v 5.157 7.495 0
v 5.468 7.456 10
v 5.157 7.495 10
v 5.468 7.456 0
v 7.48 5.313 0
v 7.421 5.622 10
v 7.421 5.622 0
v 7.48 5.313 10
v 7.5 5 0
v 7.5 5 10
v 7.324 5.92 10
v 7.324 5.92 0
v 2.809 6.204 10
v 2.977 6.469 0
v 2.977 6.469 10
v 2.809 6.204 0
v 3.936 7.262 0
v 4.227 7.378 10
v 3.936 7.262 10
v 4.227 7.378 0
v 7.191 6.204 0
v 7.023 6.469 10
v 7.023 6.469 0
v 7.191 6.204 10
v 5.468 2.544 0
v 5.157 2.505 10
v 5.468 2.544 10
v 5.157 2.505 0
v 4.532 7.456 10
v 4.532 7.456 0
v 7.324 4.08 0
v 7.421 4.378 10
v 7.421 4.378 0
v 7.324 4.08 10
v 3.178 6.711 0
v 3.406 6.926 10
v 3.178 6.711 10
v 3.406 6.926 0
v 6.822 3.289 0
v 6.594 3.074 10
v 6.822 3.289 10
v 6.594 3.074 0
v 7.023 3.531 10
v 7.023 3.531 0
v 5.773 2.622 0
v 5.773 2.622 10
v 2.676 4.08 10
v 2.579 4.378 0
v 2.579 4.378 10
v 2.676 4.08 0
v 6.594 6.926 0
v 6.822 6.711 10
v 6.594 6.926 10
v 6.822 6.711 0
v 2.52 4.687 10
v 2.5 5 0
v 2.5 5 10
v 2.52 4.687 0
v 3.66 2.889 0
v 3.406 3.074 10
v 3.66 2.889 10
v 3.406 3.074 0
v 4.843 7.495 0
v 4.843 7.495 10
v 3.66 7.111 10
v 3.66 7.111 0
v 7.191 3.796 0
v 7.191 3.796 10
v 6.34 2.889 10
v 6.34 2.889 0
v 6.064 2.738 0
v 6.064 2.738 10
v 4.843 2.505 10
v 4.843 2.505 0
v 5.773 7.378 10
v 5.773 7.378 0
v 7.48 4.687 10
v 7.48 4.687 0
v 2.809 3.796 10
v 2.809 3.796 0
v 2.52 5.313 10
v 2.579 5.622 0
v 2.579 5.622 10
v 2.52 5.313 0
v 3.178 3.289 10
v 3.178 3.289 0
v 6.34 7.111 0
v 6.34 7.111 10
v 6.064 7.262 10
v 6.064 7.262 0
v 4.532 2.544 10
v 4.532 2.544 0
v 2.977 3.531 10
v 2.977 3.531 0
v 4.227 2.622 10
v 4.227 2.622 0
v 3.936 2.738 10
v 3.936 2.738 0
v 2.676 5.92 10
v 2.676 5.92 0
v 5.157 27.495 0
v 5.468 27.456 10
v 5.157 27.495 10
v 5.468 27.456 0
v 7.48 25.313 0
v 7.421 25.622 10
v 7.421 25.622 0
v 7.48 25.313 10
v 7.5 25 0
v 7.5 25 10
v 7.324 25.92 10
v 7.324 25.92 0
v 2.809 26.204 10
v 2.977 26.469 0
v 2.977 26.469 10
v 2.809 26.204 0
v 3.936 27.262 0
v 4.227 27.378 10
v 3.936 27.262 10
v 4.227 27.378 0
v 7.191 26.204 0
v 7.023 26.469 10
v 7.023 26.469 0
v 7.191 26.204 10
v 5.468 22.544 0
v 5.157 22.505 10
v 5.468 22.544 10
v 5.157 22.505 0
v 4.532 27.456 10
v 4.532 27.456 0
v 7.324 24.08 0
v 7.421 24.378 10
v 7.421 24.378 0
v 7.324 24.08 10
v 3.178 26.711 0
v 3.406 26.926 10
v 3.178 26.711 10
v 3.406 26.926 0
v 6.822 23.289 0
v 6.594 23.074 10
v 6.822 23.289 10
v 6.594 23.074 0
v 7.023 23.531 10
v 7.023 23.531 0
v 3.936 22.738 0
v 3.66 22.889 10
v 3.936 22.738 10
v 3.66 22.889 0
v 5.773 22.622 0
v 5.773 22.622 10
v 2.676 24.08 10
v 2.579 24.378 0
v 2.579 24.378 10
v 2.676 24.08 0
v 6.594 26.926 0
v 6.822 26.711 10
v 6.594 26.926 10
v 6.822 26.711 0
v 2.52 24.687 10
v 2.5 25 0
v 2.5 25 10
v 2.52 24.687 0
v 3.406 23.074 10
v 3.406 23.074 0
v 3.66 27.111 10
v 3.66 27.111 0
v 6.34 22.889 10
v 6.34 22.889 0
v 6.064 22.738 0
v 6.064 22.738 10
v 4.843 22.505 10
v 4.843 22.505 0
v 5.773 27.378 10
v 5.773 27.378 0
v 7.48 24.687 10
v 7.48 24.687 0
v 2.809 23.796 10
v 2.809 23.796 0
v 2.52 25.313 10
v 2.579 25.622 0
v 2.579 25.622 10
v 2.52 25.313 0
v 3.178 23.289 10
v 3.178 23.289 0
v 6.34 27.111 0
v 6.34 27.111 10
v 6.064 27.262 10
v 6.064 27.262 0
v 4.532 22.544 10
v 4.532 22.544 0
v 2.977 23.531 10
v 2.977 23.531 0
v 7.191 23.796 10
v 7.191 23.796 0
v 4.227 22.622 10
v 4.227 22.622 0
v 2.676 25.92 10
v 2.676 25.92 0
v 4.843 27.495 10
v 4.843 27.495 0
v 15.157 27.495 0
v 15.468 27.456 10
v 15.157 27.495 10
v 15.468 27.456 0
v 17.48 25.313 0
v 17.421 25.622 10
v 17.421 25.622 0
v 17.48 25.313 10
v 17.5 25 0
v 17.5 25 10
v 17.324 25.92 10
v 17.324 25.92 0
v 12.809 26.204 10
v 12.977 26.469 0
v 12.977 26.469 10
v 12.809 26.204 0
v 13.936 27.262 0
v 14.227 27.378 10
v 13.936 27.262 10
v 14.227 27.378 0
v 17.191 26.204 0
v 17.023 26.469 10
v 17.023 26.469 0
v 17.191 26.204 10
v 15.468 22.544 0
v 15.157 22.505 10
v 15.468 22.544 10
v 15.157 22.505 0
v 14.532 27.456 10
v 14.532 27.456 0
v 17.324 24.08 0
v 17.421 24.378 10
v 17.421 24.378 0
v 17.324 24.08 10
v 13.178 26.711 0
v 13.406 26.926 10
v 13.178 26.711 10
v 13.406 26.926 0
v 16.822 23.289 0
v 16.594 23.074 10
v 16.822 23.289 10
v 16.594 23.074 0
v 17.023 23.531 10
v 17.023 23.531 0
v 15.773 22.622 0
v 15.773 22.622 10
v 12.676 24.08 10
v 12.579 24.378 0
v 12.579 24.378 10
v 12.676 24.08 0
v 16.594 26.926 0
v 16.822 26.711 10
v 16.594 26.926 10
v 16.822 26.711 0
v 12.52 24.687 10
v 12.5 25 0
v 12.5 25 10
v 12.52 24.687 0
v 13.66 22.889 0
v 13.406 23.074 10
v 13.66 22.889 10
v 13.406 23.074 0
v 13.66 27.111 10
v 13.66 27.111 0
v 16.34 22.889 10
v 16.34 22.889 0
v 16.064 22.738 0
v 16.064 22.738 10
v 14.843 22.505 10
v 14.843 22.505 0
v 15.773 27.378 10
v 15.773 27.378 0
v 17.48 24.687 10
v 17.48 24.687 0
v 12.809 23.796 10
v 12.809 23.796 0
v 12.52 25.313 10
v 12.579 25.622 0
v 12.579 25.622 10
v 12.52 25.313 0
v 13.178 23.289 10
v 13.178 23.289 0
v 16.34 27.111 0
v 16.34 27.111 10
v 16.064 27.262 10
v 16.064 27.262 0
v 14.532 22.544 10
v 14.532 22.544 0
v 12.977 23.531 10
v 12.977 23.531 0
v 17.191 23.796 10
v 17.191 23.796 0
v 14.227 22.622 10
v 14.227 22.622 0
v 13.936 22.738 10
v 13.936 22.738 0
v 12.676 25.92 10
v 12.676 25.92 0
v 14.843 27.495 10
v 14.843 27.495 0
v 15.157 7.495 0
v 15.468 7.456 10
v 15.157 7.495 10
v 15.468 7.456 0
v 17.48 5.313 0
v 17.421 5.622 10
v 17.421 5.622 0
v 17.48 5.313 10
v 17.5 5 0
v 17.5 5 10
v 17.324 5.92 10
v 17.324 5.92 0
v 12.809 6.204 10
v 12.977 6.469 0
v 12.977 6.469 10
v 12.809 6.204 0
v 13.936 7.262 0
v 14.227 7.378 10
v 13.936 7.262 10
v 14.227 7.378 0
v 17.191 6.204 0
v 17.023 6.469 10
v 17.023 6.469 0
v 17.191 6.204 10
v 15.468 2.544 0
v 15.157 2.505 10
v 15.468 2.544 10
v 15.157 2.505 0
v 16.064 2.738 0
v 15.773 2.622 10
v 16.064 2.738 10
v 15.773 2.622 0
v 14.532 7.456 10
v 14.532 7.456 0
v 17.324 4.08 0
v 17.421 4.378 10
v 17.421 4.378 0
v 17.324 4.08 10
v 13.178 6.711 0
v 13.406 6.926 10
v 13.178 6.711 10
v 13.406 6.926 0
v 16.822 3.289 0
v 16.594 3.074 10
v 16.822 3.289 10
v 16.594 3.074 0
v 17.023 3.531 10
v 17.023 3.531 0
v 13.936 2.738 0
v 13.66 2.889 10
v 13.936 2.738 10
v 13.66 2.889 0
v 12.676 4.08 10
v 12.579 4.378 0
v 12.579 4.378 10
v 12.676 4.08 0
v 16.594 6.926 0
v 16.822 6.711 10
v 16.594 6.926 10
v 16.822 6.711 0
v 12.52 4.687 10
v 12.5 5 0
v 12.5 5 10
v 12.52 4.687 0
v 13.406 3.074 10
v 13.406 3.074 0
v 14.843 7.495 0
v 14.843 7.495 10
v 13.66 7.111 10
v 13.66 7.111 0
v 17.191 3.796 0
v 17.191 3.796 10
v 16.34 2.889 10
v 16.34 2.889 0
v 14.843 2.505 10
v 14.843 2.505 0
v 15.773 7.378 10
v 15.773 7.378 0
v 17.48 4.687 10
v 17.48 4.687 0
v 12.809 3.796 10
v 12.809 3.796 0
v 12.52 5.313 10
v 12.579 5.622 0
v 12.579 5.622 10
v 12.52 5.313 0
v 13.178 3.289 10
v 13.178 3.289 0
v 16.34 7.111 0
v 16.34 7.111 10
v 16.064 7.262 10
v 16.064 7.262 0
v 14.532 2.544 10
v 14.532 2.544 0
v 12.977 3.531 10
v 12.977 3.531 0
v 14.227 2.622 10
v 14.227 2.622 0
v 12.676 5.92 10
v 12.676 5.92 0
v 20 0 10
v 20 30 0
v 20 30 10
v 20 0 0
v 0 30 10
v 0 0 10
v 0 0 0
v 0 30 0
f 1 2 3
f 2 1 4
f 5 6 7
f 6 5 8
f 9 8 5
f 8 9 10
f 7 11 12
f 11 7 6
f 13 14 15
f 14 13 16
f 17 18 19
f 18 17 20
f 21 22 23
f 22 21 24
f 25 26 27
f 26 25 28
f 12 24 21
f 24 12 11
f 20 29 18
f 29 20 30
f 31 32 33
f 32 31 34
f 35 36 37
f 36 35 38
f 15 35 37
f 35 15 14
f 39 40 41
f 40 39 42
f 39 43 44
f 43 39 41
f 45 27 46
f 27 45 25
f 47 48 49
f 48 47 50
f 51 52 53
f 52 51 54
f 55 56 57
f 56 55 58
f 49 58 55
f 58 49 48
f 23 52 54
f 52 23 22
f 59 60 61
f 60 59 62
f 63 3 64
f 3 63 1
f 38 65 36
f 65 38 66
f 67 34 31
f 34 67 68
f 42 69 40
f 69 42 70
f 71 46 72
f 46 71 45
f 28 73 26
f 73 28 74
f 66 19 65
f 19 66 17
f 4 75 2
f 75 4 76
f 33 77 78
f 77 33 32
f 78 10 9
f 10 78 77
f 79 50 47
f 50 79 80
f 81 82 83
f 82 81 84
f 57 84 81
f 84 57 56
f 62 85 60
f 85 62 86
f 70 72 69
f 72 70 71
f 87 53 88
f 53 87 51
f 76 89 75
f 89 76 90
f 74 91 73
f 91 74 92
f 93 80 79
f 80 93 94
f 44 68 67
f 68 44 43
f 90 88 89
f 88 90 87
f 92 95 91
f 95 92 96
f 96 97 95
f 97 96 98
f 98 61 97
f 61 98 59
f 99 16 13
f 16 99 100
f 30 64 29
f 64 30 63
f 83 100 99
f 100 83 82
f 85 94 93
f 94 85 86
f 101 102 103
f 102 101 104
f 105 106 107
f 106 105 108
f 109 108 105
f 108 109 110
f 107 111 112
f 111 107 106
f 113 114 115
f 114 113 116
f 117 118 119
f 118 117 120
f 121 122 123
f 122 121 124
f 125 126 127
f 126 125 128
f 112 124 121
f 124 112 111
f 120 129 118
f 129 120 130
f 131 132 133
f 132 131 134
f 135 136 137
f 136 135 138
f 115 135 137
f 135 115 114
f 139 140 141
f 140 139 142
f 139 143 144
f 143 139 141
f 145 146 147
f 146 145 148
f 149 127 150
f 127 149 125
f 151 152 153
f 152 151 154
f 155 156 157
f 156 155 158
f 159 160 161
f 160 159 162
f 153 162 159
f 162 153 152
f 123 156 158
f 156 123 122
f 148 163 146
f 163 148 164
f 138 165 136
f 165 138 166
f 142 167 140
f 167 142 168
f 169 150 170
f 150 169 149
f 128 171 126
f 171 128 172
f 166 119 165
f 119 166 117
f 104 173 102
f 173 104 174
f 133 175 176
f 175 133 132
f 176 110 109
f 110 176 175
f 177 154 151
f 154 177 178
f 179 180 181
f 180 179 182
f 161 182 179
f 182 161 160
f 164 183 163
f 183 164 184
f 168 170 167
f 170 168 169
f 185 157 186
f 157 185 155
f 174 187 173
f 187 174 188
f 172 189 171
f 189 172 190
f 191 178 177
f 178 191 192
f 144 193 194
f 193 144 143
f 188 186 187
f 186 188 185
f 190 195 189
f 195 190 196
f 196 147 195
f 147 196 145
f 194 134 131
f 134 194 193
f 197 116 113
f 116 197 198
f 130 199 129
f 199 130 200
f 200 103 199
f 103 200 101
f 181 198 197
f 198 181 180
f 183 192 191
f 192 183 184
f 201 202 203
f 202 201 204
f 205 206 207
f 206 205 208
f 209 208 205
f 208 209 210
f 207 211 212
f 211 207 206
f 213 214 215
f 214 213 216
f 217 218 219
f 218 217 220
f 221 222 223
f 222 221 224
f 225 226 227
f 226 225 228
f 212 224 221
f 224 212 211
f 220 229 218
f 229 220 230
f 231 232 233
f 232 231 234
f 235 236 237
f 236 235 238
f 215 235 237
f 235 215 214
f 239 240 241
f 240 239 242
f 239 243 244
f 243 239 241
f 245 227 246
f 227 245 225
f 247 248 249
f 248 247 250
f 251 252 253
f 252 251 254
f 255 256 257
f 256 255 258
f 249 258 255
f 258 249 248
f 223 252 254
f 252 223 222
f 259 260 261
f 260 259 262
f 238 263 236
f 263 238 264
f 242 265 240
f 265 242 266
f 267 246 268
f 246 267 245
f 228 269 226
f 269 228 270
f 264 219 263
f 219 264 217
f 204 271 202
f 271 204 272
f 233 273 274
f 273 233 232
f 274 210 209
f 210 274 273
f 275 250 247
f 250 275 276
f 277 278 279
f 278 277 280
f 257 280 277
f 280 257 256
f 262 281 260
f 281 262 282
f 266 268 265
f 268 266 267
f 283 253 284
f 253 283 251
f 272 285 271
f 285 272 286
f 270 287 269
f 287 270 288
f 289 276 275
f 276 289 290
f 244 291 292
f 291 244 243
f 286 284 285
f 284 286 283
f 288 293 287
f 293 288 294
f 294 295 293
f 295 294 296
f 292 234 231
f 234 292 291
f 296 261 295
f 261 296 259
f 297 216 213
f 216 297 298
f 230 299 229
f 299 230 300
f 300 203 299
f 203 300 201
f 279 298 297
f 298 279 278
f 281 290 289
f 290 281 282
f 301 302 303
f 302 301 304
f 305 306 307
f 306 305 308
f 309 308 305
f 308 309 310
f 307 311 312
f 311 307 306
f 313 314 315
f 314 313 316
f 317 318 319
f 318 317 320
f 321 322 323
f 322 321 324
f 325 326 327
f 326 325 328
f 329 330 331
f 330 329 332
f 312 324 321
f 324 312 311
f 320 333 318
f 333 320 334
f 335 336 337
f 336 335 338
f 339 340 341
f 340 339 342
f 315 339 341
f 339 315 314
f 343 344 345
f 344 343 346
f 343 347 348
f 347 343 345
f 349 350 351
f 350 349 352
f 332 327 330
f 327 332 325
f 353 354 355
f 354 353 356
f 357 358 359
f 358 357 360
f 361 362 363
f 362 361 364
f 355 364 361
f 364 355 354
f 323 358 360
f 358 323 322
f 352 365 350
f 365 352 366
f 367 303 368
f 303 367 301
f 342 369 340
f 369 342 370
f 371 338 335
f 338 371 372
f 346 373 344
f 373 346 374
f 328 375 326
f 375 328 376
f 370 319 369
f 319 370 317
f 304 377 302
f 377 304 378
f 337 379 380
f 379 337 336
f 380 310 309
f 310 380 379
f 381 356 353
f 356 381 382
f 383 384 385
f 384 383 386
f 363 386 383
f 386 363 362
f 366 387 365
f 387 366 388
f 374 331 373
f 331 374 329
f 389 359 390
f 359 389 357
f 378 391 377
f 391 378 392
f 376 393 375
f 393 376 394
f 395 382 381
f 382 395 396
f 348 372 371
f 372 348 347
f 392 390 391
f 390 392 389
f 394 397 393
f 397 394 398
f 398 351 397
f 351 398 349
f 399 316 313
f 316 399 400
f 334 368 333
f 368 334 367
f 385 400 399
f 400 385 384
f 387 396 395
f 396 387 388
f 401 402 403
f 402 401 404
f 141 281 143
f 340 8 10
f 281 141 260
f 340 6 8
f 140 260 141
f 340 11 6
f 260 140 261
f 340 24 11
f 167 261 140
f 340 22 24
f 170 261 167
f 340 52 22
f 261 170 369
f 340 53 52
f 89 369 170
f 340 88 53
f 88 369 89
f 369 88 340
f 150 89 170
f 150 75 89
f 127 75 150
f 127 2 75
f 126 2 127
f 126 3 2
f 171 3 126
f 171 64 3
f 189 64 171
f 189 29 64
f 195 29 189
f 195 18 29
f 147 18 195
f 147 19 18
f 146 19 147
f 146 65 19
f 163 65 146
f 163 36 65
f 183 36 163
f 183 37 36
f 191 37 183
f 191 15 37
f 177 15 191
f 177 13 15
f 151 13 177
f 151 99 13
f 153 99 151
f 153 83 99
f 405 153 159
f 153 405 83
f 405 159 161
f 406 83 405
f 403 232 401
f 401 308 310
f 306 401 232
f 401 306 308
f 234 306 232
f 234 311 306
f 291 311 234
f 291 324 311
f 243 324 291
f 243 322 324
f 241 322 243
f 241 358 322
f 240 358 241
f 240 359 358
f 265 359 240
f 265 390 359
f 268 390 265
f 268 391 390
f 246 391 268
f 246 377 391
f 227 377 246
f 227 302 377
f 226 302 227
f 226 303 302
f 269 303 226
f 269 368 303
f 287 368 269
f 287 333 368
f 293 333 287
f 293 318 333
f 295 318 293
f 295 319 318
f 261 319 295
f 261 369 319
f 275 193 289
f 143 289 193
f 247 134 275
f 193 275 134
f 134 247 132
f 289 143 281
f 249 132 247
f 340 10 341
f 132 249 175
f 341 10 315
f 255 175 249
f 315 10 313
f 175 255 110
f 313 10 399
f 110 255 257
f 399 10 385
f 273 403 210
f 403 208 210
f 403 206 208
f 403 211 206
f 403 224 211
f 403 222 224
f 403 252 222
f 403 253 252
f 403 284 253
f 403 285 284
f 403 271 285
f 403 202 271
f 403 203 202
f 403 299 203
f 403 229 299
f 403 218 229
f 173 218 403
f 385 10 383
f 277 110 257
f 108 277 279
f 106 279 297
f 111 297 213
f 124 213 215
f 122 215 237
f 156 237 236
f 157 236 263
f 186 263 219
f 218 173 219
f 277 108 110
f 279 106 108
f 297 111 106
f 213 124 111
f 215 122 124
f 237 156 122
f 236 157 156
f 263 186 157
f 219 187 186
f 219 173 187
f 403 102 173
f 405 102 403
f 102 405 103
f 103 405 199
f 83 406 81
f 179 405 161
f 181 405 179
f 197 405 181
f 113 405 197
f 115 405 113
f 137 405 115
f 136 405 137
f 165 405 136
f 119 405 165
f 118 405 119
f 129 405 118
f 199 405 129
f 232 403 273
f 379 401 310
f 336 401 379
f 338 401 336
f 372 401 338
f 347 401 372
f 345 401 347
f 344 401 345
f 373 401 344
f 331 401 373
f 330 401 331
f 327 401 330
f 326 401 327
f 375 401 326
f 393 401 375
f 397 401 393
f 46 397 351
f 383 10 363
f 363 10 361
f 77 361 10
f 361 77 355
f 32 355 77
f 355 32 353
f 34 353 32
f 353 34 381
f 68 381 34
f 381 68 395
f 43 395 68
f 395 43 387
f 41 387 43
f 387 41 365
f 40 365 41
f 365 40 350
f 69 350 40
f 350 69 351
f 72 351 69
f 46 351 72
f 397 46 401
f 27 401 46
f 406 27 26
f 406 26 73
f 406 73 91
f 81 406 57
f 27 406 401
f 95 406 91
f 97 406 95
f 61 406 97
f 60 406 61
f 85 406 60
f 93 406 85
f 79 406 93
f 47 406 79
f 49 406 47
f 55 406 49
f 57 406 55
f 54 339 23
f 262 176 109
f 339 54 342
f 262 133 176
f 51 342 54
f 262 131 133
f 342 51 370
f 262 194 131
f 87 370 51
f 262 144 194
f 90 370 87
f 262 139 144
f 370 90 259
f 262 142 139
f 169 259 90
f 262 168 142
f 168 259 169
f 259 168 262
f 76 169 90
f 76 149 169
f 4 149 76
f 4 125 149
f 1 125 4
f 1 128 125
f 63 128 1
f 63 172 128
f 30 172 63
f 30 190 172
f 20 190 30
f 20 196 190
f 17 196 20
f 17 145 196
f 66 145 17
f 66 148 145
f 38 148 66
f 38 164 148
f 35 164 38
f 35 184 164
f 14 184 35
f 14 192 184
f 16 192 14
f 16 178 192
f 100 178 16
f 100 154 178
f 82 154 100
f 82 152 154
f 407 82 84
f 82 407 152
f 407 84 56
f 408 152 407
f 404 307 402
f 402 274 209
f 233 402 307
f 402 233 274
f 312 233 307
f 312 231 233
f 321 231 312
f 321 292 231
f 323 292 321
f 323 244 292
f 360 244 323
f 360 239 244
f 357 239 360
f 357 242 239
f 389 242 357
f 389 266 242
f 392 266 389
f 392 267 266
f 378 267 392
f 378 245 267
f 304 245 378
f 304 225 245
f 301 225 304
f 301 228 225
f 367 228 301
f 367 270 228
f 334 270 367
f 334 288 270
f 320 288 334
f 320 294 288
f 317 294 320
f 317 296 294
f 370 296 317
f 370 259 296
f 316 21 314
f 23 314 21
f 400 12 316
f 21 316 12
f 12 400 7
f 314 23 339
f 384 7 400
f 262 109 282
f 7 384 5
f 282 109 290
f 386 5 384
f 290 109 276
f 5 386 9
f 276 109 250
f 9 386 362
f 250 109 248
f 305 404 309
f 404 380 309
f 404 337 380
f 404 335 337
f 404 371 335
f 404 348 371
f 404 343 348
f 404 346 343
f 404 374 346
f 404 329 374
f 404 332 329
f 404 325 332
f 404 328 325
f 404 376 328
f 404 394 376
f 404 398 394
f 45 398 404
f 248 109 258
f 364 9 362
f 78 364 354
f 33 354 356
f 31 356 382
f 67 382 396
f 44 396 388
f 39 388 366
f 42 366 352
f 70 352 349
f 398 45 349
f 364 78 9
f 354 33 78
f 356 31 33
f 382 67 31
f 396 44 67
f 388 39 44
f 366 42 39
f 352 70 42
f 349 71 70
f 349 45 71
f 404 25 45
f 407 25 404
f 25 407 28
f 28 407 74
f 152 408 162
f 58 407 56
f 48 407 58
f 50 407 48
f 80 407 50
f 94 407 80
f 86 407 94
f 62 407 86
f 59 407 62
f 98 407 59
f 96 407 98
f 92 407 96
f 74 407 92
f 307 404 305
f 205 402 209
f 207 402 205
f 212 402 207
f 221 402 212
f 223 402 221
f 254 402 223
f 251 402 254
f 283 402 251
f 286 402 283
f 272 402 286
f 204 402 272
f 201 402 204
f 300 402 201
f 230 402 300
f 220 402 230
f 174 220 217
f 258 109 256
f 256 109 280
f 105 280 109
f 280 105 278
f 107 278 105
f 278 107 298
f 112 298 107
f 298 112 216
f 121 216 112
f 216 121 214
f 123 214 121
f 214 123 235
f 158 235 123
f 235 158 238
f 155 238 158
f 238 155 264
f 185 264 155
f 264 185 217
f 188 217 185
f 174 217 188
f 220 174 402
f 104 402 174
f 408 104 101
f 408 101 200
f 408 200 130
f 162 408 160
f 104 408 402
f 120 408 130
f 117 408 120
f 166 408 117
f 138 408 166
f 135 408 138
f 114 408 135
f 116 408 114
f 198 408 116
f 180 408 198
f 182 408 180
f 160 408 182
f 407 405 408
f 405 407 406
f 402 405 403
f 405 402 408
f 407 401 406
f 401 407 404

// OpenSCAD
// file: round-hole.scad
// Round Hole

// Defaults

gRes = 50;
gNudge = 0.01;

module RoundHole(
	PosX,	// drill position x
	PosY,	// drill position y
	Dia,		// drill diameter
	Depth,	// drill depth
	Res = gRes,		// render resolution
	Nudge = gNudge)	// render error compensation
	{
	translate([PosX,PosY,-Nudge]) 
	cylinder(h = Nudge + Depth + Nudge, d = Dia, $fn = Res);
	}

RoundHole(10,15,5,10);
// file: round-holes.scad
// Round Holes

use <round-hole.scad>;

// Defaults

gRes = 50;
gNudge = 0.01;

module RoundHoles(
	DrillSched,		// drill schedule list, [[PosX,PosY,Dia,Depth],...]
	Res = gRes,		// render resolution
	Nudge = gNudge)	// render error compensation
	{
	for(sched = DrillSched)
		{
		RoundHole(sched[0], sched[1], sched[2], sched[3], Res = gRes, Nudge = gNudge);
		}
	}

RoundHoles([[10,10,5,10],[10,-10,5,10],[-10,10,5,10],[-10,-10,5,10]]);
// main file
// Square Bracket

use <round-holes.scad>;

// Defaults

gRes = 50;
gNudge = 0.01;

module SquareBracket(
    DimX,           // width
    DimY,           // length
    DimZ,           // thickness
    //FastenerPosX,   // fastener width position
    //FastenerPosY,   // fastener length position
    //FastenerDia,    // fastener diameter
	DrillSched,   // drill schedule list, [[PosX,PosY,Dia,Depth],...]
    Res = gRes,     // render resolution
    Nudge = gNudge) // render error compensation
	{
	difference()
		{
		color("green") cube([DimX, DimY, DimZ]);
		color("red")
		RoundHoles(DrillSched);
		}
	}

SquareBracket(20,30,10, [[5,5,5,10],[5,25,5,10],[15,25,5,10],[15,5,5,10]]);
